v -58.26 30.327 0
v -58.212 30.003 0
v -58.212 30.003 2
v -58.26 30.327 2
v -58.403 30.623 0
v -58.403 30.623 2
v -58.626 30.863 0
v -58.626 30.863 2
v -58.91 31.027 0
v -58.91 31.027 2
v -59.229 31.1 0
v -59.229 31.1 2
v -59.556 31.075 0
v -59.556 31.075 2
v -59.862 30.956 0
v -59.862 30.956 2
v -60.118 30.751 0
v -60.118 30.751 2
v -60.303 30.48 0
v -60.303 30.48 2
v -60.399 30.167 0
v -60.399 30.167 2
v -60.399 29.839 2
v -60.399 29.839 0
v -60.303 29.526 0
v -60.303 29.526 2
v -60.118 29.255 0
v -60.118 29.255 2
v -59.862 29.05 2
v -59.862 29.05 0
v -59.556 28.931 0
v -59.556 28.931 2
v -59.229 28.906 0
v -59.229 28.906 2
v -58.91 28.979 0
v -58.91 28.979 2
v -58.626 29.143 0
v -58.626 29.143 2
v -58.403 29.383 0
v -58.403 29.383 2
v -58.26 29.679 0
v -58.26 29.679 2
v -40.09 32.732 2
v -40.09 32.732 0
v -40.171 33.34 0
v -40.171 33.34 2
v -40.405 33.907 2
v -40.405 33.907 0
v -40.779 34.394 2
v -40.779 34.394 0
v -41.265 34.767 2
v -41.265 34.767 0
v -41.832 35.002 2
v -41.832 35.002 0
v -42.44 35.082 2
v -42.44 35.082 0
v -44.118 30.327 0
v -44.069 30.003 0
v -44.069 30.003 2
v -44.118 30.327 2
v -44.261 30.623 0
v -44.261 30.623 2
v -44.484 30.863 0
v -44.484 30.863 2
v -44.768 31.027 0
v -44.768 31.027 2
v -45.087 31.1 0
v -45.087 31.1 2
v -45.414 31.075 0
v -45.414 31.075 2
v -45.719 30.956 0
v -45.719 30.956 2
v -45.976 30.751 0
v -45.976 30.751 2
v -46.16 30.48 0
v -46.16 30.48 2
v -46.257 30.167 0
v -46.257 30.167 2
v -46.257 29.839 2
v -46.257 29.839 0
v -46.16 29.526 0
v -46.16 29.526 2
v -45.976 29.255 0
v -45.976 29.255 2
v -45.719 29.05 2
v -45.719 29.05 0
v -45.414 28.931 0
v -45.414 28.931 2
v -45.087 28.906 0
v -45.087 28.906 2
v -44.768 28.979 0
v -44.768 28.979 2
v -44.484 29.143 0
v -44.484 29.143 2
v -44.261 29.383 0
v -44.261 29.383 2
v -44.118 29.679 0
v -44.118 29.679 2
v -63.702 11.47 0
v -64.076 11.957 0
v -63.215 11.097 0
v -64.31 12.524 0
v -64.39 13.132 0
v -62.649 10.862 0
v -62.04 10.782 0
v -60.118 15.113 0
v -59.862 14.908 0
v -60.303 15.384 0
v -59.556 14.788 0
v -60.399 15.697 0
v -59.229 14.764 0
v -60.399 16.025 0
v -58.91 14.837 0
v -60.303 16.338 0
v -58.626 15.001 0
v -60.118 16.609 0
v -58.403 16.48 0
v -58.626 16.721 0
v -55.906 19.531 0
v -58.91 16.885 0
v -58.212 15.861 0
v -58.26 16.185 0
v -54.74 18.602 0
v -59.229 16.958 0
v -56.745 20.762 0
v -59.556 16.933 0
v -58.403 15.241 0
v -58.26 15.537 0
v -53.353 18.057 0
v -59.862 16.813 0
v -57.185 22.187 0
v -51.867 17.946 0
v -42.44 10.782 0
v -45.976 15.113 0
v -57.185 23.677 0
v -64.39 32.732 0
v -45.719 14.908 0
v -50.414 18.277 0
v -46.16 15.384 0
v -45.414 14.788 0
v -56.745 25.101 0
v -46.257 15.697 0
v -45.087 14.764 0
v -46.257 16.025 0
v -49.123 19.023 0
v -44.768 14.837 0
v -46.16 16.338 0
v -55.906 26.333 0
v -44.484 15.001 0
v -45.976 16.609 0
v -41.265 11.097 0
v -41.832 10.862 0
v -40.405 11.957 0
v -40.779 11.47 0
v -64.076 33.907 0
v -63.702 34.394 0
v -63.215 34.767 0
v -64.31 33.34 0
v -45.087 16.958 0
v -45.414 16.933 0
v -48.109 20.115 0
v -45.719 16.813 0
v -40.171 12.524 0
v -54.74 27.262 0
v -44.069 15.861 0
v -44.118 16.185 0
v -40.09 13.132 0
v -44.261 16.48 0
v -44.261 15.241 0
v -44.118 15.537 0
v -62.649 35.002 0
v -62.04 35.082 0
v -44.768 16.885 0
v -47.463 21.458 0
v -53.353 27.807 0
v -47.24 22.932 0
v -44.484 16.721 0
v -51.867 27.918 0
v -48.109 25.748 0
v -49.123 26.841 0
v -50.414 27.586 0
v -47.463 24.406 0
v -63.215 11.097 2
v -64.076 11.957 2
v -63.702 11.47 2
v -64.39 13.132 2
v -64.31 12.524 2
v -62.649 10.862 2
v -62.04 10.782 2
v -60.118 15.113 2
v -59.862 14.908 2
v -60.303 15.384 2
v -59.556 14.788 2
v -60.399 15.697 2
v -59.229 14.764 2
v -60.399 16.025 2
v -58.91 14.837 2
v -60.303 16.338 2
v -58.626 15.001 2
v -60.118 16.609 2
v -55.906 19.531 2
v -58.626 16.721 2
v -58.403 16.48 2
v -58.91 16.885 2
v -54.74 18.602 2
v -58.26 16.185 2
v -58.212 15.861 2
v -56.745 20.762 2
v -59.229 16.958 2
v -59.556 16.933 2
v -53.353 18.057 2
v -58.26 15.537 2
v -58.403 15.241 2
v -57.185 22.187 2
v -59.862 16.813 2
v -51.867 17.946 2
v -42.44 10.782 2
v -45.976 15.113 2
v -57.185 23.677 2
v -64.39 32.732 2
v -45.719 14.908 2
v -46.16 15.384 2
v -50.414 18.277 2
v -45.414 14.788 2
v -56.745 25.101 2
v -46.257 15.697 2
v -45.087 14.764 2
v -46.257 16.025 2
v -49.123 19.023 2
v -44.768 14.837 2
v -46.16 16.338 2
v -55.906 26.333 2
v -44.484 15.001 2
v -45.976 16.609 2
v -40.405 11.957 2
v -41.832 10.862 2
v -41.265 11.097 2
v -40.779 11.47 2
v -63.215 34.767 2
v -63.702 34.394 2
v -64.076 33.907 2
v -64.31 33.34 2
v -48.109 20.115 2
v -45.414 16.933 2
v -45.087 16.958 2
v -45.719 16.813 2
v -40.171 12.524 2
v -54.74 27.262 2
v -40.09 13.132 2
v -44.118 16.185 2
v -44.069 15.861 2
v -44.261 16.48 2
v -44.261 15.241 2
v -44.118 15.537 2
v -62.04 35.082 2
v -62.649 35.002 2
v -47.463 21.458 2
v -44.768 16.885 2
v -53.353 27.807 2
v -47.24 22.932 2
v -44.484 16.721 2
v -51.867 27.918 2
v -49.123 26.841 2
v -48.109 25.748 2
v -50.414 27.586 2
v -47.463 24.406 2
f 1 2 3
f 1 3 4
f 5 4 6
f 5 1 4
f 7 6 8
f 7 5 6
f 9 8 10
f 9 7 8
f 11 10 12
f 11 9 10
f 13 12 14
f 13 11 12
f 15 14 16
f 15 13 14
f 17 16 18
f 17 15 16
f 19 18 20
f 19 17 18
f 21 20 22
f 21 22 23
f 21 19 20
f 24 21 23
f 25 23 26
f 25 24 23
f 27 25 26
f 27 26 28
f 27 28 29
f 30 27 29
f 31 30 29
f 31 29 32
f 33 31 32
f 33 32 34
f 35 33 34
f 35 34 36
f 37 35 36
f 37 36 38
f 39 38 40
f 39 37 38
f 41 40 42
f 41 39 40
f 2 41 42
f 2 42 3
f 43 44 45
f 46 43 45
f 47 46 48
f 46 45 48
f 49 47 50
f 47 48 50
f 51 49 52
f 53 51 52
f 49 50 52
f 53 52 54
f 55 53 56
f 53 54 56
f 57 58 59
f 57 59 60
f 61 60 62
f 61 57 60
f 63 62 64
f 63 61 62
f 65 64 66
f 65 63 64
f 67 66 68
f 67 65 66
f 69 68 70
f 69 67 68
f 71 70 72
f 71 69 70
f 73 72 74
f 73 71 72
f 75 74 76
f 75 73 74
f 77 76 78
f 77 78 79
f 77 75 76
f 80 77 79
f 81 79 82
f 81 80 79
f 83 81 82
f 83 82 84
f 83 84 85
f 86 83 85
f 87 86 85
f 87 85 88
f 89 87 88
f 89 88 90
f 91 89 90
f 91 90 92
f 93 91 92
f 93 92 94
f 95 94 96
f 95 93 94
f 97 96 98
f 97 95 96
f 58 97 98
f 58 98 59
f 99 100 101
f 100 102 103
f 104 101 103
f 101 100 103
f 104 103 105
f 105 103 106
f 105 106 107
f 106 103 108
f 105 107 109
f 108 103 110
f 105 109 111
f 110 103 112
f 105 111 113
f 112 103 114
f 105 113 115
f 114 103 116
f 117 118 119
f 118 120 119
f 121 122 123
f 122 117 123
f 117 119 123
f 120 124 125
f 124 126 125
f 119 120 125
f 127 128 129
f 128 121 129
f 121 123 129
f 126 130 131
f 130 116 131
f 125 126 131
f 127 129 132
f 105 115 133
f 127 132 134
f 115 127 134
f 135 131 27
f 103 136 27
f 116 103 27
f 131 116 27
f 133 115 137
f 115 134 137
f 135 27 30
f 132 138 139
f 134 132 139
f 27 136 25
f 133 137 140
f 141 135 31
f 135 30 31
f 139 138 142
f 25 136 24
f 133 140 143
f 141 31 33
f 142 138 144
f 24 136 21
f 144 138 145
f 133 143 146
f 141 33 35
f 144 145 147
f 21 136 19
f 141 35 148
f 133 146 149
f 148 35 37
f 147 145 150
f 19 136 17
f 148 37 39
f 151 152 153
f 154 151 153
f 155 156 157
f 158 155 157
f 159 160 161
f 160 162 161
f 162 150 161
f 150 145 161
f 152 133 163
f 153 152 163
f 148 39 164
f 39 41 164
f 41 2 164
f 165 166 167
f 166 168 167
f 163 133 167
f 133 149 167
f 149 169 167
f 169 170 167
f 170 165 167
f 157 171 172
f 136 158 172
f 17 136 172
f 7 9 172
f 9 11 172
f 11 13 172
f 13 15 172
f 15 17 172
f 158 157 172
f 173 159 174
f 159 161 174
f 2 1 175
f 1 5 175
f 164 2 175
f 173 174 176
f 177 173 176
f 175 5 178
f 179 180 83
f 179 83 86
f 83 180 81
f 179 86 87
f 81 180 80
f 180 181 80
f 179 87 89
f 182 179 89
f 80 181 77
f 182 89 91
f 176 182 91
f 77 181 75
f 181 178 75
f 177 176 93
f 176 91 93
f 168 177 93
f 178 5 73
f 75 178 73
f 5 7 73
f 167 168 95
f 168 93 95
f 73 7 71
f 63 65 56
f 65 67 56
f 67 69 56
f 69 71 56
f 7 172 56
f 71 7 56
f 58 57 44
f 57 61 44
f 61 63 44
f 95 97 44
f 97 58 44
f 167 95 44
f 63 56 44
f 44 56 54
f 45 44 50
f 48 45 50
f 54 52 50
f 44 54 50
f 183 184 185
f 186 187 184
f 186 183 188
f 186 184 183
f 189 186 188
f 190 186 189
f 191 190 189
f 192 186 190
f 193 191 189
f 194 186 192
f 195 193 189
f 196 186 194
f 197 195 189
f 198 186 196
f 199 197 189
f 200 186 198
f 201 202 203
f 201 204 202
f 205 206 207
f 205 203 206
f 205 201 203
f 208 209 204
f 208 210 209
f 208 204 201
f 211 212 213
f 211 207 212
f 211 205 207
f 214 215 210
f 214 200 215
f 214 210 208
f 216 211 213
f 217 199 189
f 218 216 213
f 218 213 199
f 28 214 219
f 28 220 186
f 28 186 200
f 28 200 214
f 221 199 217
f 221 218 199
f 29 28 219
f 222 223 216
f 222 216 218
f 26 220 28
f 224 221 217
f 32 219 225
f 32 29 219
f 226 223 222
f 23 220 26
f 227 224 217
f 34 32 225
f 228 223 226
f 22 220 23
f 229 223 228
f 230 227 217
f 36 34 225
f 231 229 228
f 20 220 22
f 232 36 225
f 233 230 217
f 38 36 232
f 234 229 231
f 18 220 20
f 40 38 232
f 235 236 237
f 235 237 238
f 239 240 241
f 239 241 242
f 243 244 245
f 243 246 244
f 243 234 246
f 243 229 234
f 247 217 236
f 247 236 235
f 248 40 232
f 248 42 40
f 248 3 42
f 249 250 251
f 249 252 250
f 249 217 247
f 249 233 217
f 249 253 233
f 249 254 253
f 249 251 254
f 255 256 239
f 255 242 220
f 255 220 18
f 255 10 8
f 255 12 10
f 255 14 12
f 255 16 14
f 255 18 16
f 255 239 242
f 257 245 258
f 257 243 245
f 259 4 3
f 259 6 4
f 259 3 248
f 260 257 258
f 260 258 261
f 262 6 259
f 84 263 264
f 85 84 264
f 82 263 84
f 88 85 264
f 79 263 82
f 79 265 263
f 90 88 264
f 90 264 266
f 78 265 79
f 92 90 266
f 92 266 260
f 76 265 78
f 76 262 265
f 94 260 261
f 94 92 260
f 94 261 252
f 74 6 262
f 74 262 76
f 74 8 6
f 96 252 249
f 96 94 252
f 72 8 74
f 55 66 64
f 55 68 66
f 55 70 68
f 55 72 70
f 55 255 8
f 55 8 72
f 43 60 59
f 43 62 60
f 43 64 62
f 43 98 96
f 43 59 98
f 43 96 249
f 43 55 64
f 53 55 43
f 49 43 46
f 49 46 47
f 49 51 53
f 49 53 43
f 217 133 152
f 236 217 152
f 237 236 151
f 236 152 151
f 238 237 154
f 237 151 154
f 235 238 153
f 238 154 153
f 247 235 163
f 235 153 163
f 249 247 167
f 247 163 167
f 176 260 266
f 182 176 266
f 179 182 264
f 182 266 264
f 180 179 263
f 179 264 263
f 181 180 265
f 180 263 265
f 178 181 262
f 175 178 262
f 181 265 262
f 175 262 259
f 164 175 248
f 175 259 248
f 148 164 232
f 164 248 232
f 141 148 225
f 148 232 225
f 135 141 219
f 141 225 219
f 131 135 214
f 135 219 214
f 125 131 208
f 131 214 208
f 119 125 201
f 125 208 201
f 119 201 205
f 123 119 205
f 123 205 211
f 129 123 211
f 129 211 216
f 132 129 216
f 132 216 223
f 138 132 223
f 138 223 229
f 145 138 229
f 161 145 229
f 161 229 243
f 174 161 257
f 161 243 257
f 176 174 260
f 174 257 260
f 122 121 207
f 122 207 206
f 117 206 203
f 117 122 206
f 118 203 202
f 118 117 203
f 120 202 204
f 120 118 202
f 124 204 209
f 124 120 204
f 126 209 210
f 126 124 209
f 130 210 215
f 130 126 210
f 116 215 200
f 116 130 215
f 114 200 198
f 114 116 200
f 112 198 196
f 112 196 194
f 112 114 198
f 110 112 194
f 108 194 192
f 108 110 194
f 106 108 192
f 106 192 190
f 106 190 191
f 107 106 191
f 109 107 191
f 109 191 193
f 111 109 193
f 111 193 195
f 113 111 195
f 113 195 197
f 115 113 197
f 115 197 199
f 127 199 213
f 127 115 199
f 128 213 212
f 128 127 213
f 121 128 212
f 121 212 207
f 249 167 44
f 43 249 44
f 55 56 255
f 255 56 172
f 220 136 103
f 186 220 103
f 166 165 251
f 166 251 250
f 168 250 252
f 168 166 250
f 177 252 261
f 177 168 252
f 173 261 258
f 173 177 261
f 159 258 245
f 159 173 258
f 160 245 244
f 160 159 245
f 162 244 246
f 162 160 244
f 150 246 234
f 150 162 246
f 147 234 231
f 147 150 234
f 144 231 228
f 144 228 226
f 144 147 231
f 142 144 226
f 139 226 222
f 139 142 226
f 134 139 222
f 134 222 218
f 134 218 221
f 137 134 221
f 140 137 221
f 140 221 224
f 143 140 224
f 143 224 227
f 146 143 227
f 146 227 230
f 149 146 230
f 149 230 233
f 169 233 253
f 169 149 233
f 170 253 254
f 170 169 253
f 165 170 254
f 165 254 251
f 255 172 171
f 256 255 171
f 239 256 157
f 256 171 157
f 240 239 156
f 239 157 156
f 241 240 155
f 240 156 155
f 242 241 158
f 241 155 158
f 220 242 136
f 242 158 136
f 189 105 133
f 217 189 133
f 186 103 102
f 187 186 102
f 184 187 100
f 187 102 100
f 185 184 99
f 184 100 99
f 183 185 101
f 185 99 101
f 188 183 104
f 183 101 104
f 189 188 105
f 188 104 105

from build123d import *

# Parameters (mm, degrees)
CROQUIS1_R              = 1.1
CROQUIS1_R_2            = 3
SALIENTE_EXTRUIR1_DEPTH = 2
CORTAR_EXTRUIR1_START   = -2
CORTAR_EXTRUIR1_DEPTH   = 2
CROQUIS3_R              = 5
CORTAR_EXTRUIR2_DEPTH   = 2


with BuildPart() as part:
    # Croquis1 → Saliente-Extruir1 (new body)
    with BuildSketch(Plane.XY):
        with BuildLine():
            Line((-64.740473431, 32.731866916), (-64.740473431, 13.131866916))
            ThreePointArc((-64.740473431, 13.131866916), (-63.949661741, 11.222678607), (-62.040473431, 10.431866916))
            Line((-62.040473431, 10.431866916), (-42.440473431, 10.431866916))
            ThreePointArc((-42.440473431, 10.431866916), (-40.531285122, 11.222678607), (-39.740473431, 13.131866916))
            Line((-39.740473431, 13.131866916), (-39.740473431, 32.731866916))
            ThreePointArc((-39.740473431, 32.731866916), (-40.531285122, 34.641055225), (-42.440473431, 35.431866916))
            Line((-42.440473431, 35.431866916), (-62.040473431, 35.431866916))
            ThreePointArc((-62.040473431, 35.431866916), (-63.949661741, 34.641055225), (-64.740473431, 32.731866916))
        make_face()
        with Locations((-45.16940562, 30.002934728)):
            Circle(CROQUIS1_R, mode=Mode.SUBTRACT)
        with Locations((-52.240473431, 22.931866916)):
            Circle(CROQUIS1_R_2, mode=Mode.SUBTRACT)
        with Locations((-45.16940562, 15.860799104)):
            Circle(CROQUIS1_R, mode=Mode.SUBTRACT)
        with Locations((-59.311541243, 15.860799104)):
            Circle(CROQUIS1_R, mode=Mode.SUBTRACT)
        with Locations((-59.311541243, 30.002934728)):
            Circle(CROQUIS1_R, mode=Mode.SUBTRACT)
    extrude(amount=SALIENTE_EXTRUIR1_DEPTH)

    # Croquis2 → Cortar-Extruir1 (cut)
    with BuildSketch(Plane.XY.offset(2).offset(CORTAR_EXTRUIR1_START)):
        with BuildLine():
            Line((-64.740473431, 32.731866916), (-64.740473431, 13.131866916))
            ThreePointArc((-64.740473431, 13.131866916), (-63.949661741, 11.222678607), (-62.040473431, 10.431866916))
            Line((-62.040473431, 10.431866916), (-42.440473431, 10.431866916))
            ThreePointArc((-42.440473431, 10.431866916), (-40.531285122, 11.222678607), (-39.740473431, 13.131866916))
            Line((-39.740473431, 13.131866916), (-39.740473431, 32.731866916))
            ThreePointArc((-39.740473431, 32.731866916), (-40.531285122, 34.641055225), (-42.440473431, 35.431866916))
            Line((-42.440473431, 35.431866916), (-62.040473431, 35.431866916))
            ThreePointArc((-62.040473431, 35.431866916), (-63.949661741, 34.641055225), (-64.740473431, 32.731866916))
        make_face()
        with BuildLine():
            Line((-64.390473431, 32.731866916), (-64.390473431, 13.131866916))
            ThreePointArc((-64.390473431, 13.131866916), (-63.702174367, 11.47016598), (-62.040473431, 10.781866916))
            Line((-62.040473431, 10.781866916), (-42.440473431, 10.781866916))
            ThreePointArc((-42.440473431, 10.781866916), (-40.778772496, 11.47016598), (-40.090473431, 13.131866916))
            Line((-40.090473431, 13.131866916), (-40.090473431, 32.731866916))
            ThreePointArc((-40.090473431, 32.731866916), (-40.778772496, 34.393567852), (-42.440473431, 35.081866916))
            Line((-42.440473431, 35.081866916), (-62.040473431, 35.081866916))
            ThreePointArc((-62.040473431, 35.081866916), (-63.702174367, 34.393567852), (-64.390473431, 32.731866916))
        make_face(mode=Mode.SUBTRACT)
    extrude(amount=CORTAR_EXTRUIR1_DEPTH, mode=Mode.SUBTRACT)

    # Croquis3 → Cortar-Extruir2 (cut)
    with BuildSketch(Plane.XY.offset(2)):
        with Locations((-52.240473431, 22.931866916)):
            Circle(CROQUIS3_R)
    extrude(amount=-CORTAR_EXTRUIR2_DEPTH, mode=Mode.SUBTRACT)


solid = part.part
